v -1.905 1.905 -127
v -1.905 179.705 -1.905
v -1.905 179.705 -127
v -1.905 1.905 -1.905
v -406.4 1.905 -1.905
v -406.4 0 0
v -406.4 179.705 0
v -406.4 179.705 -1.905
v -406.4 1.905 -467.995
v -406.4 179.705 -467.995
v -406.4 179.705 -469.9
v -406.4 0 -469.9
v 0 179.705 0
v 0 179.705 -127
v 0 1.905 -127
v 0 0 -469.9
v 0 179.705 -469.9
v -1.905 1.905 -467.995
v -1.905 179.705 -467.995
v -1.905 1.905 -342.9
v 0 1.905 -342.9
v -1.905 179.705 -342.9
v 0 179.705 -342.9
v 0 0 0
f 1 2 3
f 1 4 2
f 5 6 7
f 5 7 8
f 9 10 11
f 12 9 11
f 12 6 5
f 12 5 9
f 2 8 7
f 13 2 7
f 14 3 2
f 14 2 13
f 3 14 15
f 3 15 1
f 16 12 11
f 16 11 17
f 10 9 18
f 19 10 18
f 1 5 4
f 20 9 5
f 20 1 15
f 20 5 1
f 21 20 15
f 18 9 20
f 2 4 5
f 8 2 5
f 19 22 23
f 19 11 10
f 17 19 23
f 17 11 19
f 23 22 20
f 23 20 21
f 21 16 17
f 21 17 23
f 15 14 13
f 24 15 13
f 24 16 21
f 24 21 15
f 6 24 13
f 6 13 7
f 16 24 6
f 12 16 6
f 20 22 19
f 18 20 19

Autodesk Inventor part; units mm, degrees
ref_plane "YZ Plane" through (0, 0, 0) normal (1, 0, 0) x (0, 1, 0)
ref_plane "XZ Plane" through (0, 0, 0) normal (0, 1, 0) x (-1, 0, 0)
ref_plane "XY Plane" through (0, 0, 0) normal (0, 0, 1) x (1, 0, 0)
sketch "Sketch1" plane through (0, 0, 0) normal (0, 1, 0) x (-1, 0, 0)
  line L0 (0, 0) -> (406.4, 0)
  line L1 (406.4, 0) -> (406.4, -469.9)
  line L2 (406.4, -469.9) -> (0, -469.9)
  line L3 (0, -469.9) -> (0, 0)
  dimension "d0" = 406.4
  dimension "d1" = 469.9
extrude "Extrusion1" add sketch "Sketch1" along normal blind 1.905
sketch "Sketch2" plane through (0, 1.905, 0) normal (0, 1, 0) x (1, 0, 0)
  line L0 (-406.4, 469.9) -> (-406.4, 0) projected
  line L1 (0, 0) -> (0, 469.9) projected
  line L2 (-406.4, 0) -> (0, 0)
  line L3 (0, 0) -> (0, 1.905)
  line L4 (-1.905, 1.905) -> (-406.4, 1.905)
  line L5 (-406.4, 1.905) -> (-406.4, 0)
  line L6 (0, 469.9) -> (-406.4, 469.9) projected
  line L7 (0, 0) -> (-52.705, 0)
  line L8 (-1.905, 1.905) -> (-1.905, 467.995)
  line L9 (-1.905, 469.9) -> (0, 469.9)
  line L10 (0, 469.9) -> (0, 0)
  line L11 (0, 469.9) -> (-406.4, 469.9)
  line L12 (-406.4, 469.9) -> (-406.4, 467.995)
  line L13 (-406.4, 467.995) -> (-1.905, 467.995)
  line L14 (0, 467.995) -> (0, 469.9)
  dimension "d4" = 1.905
  dimension "d5" = 1.905
  dimension "d6" = 1.905
  dimension "d13" = 1.905
extrude "Extrusion2" add sketch "Sketch2" along normal blind 177.8 contours L6 L1 L2 L0 L4 L8 L13
sketch "Sketch3" plane through (0, 179.705, 0) normal (0, 1, 0) x (1, 0, 0)
  line L0 (-1.905, 467.995) -> (-1.905, 1.905) projected
  line L1 (0, 469.9) -> (0, 0) projected
  line L2 (-1.905, 342.9) -> (0, 342.9)
  line L3 (0, 342.9) -> (0, 127)
  line L4 (0, 127) -> (-1.905, 127)
  line L5 (-1.905, 127) -> (-1.905, 342.9)
  line L6 (-406.4, 0) -> (0, 0) projected
  line L7 (0, 469.9) -> (-406.4, 469.9) projected
  dimension "d9" = 127
  dimension "d10" = 127
extrude "Extrusion3" cut sketch "Sketch3" against normal blind 177.8
properties part number "hopper_bottom2"
